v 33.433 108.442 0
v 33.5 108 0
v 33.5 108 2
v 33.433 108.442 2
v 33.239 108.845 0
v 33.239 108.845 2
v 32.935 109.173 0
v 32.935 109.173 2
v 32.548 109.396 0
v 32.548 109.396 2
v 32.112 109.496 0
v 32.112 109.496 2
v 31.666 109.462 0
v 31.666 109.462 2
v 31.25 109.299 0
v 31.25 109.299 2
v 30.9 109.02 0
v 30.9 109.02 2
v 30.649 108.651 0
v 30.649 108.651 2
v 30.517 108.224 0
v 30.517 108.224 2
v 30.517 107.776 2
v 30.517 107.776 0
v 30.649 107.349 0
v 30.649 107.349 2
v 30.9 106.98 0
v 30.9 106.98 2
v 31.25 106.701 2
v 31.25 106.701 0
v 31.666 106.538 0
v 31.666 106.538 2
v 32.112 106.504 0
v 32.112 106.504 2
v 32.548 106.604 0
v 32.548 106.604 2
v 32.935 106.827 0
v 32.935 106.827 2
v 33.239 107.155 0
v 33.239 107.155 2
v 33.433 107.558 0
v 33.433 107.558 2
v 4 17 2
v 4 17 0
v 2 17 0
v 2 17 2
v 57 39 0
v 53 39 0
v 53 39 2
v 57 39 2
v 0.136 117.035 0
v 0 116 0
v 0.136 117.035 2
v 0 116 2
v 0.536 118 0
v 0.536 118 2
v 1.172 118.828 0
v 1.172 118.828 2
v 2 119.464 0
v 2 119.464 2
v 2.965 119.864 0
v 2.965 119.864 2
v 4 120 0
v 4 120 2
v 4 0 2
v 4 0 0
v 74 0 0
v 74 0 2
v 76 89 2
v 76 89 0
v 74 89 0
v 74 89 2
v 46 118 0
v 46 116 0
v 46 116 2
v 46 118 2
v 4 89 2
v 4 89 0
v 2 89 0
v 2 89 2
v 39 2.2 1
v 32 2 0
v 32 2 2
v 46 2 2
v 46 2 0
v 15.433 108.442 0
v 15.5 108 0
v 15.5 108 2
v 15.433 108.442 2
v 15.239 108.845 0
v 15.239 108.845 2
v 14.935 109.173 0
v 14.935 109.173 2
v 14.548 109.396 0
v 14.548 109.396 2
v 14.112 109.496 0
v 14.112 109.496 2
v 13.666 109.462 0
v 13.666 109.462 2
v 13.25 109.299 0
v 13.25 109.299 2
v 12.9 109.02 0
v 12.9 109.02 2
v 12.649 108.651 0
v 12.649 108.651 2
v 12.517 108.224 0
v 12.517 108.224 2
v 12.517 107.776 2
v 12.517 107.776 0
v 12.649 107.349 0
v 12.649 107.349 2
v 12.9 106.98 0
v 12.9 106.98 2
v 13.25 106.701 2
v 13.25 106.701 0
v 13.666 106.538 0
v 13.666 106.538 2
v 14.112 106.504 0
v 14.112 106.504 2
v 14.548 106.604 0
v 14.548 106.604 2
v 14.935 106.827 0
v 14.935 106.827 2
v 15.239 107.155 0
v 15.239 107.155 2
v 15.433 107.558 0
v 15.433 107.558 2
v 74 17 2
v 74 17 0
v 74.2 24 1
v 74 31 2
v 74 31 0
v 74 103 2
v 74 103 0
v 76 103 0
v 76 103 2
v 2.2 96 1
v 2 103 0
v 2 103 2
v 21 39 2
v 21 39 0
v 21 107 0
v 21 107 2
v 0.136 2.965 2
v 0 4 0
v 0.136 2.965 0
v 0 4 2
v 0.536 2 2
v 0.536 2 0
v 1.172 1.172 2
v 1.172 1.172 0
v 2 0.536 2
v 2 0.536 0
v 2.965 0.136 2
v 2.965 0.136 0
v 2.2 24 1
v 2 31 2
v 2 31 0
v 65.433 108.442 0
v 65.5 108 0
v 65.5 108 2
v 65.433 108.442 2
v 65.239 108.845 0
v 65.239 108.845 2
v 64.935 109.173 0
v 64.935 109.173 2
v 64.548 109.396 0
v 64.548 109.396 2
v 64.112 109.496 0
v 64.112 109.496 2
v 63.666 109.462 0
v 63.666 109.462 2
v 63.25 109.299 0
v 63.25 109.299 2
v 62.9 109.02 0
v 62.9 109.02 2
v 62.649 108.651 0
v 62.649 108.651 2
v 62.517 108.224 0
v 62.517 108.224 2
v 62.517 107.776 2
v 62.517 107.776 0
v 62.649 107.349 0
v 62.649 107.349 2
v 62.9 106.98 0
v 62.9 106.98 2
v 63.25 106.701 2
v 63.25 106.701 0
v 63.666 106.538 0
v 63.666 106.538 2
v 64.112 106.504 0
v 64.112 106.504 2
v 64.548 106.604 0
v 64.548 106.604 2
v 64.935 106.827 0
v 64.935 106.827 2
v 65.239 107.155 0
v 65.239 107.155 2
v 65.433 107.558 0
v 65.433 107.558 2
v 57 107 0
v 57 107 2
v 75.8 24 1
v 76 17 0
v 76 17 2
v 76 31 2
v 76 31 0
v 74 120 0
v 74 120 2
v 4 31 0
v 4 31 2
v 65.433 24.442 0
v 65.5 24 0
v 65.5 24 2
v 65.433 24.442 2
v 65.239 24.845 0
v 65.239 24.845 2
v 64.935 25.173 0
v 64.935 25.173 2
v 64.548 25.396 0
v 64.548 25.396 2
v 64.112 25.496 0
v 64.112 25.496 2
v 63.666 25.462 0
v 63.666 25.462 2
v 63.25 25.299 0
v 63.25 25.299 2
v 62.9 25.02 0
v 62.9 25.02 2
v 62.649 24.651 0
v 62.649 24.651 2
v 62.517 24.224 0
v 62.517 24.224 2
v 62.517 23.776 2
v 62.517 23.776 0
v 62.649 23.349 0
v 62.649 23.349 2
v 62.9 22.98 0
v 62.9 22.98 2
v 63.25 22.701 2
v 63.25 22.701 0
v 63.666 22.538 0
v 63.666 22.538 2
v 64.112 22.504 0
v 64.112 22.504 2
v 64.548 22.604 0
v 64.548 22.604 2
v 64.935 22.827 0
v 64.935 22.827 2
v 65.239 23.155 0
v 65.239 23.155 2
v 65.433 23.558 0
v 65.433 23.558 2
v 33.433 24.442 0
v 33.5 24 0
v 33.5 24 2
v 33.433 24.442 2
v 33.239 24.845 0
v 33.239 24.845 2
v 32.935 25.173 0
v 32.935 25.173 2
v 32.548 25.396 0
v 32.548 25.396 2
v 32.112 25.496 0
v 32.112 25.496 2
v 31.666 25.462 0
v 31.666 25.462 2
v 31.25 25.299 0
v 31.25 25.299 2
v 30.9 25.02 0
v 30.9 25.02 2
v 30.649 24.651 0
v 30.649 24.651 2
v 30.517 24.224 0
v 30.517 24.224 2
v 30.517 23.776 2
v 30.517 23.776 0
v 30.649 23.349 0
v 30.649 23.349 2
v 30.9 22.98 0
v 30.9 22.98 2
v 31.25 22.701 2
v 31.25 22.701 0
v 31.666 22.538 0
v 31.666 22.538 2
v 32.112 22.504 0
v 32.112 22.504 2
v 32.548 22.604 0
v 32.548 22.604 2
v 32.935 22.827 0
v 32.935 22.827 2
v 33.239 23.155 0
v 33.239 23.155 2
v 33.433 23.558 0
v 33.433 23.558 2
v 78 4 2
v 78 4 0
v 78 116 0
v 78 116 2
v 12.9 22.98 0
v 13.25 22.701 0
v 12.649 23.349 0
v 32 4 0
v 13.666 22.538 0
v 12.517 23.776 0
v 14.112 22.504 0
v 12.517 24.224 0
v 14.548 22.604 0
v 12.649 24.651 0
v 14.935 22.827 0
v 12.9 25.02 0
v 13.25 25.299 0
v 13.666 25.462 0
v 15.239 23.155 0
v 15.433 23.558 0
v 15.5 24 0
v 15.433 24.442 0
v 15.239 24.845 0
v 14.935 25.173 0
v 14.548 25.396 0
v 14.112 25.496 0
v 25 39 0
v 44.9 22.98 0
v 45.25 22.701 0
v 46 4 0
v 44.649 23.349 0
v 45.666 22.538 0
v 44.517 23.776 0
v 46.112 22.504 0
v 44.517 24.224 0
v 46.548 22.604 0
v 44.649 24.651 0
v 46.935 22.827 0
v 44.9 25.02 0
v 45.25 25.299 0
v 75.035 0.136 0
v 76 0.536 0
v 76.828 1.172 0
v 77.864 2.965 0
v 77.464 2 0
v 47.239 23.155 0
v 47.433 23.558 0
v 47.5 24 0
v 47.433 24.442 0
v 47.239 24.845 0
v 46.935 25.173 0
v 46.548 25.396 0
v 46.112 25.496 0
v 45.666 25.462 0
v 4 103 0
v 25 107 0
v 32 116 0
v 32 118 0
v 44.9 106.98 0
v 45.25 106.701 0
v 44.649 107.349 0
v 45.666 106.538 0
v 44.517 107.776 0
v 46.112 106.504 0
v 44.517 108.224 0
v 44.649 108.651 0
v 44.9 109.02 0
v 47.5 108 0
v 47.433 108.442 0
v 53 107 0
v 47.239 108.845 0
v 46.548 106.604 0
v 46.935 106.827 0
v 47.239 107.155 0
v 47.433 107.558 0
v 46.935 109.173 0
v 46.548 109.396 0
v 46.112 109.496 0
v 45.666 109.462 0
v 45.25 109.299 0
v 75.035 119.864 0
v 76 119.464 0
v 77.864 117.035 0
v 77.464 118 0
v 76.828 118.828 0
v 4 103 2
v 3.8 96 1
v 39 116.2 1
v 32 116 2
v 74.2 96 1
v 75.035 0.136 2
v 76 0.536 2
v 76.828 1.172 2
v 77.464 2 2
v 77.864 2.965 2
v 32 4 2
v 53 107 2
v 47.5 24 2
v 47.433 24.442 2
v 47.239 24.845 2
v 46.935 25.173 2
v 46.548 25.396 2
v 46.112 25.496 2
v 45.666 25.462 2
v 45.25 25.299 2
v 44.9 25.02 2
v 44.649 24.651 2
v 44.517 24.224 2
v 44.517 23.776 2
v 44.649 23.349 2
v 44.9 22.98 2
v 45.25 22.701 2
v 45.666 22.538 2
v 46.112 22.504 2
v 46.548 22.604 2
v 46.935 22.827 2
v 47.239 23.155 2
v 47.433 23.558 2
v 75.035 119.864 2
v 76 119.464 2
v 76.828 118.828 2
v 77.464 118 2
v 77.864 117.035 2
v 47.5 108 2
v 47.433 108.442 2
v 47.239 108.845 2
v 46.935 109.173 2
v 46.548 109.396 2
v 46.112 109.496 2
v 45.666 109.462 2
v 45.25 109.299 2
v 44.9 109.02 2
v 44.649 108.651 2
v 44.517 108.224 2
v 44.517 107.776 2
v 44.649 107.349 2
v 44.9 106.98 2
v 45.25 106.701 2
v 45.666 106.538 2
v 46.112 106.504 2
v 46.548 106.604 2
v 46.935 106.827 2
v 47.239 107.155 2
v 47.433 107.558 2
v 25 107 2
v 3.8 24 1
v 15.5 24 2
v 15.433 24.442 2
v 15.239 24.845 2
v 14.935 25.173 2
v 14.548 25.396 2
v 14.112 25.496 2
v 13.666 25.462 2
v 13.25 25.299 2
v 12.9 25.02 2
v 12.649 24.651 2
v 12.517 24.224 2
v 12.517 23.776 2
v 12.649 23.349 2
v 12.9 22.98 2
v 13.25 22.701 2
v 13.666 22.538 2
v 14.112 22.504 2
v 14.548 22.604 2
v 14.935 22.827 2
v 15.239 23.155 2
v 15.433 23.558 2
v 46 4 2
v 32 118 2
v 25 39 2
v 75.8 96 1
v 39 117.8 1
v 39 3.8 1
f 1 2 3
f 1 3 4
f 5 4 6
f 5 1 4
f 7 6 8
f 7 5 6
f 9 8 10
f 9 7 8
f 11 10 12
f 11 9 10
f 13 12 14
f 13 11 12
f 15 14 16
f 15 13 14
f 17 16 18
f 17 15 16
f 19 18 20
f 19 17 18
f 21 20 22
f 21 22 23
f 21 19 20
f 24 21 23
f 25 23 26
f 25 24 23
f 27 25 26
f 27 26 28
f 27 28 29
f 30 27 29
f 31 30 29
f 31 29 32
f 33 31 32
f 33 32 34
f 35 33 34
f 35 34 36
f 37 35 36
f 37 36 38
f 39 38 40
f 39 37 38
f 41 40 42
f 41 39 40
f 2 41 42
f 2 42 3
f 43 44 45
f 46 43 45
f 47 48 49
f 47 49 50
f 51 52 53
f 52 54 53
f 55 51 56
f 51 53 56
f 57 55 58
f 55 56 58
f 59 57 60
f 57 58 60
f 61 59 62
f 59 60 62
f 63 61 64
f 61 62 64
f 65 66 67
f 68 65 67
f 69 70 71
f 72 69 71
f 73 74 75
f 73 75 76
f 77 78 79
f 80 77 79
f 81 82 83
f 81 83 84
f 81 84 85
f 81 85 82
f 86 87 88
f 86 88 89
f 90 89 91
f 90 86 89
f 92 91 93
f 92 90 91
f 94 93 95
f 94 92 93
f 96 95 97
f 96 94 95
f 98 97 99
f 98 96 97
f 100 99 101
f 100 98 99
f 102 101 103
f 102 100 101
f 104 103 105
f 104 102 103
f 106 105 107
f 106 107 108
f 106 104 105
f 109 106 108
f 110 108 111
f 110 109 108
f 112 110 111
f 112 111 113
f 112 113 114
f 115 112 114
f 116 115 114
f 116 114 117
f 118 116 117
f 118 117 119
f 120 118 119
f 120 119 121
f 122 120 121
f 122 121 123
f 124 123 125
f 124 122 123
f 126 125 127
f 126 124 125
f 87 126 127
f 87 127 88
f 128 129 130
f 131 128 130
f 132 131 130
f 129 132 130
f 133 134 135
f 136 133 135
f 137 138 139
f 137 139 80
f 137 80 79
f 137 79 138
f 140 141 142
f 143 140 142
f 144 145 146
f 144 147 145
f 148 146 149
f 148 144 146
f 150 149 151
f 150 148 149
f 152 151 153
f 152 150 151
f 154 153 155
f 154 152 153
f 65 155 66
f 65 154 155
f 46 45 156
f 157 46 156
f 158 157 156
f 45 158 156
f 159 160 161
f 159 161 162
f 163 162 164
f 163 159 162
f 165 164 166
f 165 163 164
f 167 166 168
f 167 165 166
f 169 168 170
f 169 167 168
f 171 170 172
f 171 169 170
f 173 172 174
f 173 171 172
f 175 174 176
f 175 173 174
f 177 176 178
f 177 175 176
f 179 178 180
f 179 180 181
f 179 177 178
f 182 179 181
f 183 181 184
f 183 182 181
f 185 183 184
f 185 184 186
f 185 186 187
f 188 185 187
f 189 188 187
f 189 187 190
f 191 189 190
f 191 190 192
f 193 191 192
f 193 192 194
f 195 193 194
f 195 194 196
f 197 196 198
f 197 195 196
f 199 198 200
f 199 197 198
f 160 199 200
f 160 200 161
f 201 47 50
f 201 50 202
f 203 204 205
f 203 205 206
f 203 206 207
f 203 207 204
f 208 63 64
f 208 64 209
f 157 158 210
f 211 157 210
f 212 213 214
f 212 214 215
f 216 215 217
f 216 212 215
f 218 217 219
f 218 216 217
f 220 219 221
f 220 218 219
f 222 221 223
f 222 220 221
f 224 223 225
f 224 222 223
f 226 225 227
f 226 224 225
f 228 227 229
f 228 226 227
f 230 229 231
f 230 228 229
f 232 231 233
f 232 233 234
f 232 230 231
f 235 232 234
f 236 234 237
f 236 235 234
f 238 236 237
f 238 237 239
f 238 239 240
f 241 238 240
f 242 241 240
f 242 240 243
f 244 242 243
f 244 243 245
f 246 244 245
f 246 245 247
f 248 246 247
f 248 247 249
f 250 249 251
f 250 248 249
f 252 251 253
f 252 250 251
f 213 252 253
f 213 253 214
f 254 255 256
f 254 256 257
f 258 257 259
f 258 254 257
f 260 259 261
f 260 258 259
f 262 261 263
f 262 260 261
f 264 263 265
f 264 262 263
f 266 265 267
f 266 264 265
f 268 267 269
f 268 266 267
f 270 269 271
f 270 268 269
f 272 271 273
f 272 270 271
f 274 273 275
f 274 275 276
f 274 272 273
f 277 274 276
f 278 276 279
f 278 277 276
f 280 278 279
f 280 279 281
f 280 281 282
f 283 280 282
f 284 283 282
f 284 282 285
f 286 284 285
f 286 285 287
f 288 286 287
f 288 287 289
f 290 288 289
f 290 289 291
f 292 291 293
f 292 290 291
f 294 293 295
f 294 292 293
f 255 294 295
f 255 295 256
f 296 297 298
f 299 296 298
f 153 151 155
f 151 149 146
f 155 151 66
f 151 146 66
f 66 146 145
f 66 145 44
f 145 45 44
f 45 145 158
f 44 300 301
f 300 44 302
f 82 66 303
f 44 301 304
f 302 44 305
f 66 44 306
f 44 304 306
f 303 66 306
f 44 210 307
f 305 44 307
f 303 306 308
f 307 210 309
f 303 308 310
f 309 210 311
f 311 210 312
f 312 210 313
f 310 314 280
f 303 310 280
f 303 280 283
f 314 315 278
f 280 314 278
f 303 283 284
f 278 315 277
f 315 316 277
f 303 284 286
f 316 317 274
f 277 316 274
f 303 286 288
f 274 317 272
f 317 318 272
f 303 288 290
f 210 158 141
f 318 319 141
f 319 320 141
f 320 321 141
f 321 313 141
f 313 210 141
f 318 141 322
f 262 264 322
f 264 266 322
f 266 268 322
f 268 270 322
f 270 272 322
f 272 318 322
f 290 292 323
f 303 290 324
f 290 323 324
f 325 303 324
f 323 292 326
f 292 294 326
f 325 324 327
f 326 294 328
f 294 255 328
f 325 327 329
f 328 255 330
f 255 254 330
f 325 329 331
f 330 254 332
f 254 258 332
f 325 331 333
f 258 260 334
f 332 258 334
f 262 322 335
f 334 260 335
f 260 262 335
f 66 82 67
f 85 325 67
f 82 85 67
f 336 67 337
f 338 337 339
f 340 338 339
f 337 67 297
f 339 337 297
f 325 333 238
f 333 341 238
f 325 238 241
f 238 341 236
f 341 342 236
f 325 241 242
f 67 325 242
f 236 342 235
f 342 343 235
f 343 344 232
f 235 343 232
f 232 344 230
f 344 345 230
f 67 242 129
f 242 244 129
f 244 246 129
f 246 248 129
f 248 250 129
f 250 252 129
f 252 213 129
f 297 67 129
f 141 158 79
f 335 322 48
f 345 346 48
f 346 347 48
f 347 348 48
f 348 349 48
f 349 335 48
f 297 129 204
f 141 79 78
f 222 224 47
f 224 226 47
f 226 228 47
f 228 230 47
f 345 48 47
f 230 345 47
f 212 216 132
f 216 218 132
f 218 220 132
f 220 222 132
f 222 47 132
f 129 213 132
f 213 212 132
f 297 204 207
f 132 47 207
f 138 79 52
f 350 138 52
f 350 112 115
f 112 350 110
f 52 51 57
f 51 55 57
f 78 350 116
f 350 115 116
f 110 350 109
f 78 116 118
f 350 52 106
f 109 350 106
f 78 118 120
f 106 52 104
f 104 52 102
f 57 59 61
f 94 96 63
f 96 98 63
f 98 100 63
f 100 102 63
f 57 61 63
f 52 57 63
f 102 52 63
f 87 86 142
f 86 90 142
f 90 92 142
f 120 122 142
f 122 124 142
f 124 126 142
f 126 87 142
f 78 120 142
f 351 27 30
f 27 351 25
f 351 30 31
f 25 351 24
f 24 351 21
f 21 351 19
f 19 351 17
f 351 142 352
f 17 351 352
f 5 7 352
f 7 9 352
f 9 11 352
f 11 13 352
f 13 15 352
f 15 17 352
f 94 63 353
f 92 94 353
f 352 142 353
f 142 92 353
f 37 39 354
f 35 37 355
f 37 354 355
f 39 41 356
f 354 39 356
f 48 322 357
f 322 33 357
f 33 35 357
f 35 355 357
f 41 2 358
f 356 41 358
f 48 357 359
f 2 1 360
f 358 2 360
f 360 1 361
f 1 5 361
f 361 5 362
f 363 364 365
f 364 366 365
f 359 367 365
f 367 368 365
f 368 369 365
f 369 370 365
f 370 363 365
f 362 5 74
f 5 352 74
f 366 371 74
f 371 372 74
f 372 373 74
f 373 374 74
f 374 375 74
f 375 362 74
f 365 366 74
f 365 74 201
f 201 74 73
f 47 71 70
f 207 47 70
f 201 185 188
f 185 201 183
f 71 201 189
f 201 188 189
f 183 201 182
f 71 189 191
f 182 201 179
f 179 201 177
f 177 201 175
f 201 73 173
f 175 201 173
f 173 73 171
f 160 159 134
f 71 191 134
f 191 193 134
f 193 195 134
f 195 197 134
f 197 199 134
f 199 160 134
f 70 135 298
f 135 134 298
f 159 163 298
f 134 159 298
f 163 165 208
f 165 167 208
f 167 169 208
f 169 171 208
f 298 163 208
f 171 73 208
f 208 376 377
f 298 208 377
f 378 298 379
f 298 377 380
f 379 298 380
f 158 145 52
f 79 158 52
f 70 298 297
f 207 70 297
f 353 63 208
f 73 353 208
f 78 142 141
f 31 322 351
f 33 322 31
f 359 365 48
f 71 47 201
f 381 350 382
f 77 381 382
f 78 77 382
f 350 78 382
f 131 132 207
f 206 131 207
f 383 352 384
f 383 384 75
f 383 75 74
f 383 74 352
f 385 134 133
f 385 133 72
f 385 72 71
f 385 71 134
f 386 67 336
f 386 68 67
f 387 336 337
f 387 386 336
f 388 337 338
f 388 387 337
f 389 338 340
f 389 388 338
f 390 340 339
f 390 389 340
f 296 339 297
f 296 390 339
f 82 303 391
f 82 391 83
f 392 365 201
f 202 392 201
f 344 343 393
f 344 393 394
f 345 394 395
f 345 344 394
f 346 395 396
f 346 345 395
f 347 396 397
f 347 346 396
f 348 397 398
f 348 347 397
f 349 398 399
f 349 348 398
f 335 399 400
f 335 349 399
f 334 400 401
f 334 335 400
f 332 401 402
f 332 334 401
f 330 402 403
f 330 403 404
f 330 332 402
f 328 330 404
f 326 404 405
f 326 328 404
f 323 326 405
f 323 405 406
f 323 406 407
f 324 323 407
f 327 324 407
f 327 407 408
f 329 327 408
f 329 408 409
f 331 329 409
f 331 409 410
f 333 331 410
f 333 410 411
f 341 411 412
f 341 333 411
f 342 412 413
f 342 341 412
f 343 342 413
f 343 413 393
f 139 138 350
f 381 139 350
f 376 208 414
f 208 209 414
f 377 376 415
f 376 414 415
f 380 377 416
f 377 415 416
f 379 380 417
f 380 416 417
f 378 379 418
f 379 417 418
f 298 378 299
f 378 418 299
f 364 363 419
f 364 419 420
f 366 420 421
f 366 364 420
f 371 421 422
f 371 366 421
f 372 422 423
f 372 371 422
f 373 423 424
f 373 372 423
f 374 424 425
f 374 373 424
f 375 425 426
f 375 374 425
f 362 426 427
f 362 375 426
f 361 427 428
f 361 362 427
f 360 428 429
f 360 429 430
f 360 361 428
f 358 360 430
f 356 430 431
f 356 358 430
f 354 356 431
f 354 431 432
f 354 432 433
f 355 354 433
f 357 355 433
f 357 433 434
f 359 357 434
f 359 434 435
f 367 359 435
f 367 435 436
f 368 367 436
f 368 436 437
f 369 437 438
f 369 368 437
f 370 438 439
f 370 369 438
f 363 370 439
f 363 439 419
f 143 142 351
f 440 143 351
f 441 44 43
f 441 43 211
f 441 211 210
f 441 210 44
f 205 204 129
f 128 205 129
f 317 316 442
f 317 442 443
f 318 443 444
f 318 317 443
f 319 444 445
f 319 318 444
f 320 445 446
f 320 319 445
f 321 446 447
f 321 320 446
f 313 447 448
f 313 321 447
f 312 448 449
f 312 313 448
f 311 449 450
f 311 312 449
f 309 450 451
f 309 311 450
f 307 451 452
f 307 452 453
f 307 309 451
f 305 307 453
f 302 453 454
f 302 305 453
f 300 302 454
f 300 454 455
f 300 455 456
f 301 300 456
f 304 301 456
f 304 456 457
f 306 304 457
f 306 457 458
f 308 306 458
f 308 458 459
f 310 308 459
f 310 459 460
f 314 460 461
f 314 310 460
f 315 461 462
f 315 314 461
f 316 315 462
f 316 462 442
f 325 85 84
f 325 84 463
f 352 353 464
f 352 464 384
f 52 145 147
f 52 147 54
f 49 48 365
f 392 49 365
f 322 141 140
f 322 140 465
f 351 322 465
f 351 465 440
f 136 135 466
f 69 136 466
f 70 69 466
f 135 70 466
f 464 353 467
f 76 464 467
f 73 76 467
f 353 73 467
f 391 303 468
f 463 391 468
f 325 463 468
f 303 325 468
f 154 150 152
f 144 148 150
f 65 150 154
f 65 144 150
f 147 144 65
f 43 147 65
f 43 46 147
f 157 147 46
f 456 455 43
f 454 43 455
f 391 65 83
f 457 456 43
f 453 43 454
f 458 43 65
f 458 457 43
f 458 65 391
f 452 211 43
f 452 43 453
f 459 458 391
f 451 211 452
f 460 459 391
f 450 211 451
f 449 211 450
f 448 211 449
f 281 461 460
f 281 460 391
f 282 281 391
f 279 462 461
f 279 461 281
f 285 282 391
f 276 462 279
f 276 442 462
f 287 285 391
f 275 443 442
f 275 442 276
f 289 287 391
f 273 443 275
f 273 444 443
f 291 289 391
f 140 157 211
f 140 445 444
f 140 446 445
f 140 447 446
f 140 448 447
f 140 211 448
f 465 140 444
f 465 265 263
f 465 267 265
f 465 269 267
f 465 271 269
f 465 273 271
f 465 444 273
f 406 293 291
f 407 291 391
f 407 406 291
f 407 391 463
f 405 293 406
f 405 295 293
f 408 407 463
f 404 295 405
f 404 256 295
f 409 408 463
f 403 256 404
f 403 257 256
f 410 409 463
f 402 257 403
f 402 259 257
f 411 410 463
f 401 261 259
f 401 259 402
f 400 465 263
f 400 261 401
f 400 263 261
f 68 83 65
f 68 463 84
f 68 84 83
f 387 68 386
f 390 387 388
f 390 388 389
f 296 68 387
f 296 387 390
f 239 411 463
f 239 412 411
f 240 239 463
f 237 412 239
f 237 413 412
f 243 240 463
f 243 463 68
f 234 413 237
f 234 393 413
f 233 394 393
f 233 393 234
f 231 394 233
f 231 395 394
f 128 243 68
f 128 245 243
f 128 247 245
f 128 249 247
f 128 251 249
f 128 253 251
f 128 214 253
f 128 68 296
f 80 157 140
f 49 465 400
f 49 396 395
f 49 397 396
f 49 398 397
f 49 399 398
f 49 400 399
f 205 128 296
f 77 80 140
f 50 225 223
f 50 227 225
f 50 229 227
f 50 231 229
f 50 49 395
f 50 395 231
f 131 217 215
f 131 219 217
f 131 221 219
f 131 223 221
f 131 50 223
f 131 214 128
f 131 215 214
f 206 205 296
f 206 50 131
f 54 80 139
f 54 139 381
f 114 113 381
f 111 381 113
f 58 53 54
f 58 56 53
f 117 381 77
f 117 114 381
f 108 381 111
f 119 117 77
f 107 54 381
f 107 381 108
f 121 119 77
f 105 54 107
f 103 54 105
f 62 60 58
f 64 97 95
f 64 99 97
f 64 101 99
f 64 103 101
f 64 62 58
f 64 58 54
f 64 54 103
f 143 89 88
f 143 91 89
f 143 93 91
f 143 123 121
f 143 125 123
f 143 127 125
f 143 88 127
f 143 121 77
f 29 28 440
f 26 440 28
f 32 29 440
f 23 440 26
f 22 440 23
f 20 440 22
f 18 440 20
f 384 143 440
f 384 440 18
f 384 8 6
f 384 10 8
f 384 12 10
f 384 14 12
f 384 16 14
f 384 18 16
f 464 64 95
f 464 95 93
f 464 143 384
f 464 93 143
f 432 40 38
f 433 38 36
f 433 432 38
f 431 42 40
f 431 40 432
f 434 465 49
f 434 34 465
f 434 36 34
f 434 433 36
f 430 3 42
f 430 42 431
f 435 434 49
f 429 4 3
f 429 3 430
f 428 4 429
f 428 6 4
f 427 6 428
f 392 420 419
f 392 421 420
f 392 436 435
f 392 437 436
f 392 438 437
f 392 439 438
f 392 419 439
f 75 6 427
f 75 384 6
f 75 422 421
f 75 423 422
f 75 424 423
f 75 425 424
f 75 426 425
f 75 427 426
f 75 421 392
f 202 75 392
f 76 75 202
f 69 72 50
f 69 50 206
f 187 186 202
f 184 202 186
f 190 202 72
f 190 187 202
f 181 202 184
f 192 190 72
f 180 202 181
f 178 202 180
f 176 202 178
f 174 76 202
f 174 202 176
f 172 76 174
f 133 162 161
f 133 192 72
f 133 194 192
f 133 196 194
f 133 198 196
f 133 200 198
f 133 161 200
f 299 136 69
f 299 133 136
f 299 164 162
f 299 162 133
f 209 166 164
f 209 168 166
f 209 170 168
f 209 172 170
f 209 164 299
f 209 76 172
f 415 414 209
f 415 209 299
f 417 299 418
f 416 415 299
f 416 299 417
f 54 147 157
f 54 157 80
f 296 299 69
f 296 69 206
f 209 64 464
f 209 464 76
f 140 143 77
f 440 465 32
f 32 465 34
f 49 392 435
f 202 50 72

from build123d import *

# Parameters (mm, degrees)
SKETCH1_W              = 78
SKETCH1_H              = 120
SKETCH1_R              = 1.5
SKETCH1_W_2            = 4
SKETCH1_H_2            = 68
MAIN_SLIDER_TOP_DEPTH  = 2
SLIDE_TOP_CONTOURING_R = 4


with BuildPart() as part:
    # Sketch1 → Main Slider Top (new body)
    with BuildSketch(Plane.XY):
        with Locations((39, 60)):
            Rectangle(SKETCH1_W, SKETCH1_H)
        with Locations((14, 108)):
            Circle(SKETCH1_R, mode=Mode.SUBTRACT)
        with Locations((32, 108)):
            Circle(SKETCH1_R, mode=Mode.SUBTRACT)
        with Locations((14, 24)):
            Circle(SKETCH1_R, mode=Mode.SUBTRACT)
        with Locations((32, 24)):
            Circle(SKETCH1_R, mode=Mode.SUBTRACT)
        with Locations((46, 108)):
            Circle(SKETCH1_R, mode=Mode.SUBTRACT)
        with Locations((64, 108)):
            Circle(SKETCH1_R, mode=Mode.SUBTRACT)
        with Locations((46, 24)):
            Circle(SKETCH1_R, mode=Mode.SUBTRACT)
        with Locations((64, 24)):
            Circle(SKETCH1_R, mode=Mode.SUBTRACT)
        with Locations((23, 73)):
            Rectangle(SKETCH1_W_2, SKETCH1_H_2, mode=Mode.SUBTRACT)
        with Locations((55, 73)):
            Rectangle(SKETCH1_W_2, SKETCH1_H_2, mode=Mode.SUBTRACT)
        with BuildLine():
            Line((32, 118), (32, 116))
            add(Edge.make_bspline(
                [(32, 116), (39, 116.4), (46, 116)],
                knots=[0, 0, 0, 1, 1, 1], degree=2))
            Line((46, 116), (46, 118))
            add(Edge.make_bspline(
                [(32, 118), (39, 117.6), (46, 118)],
                knots=[0, 0, 0, 1, 1, 1], degree=2))
        make_face(mode=Mode.SUBTRACT)
        with BuildLine():
            Line((46, 2), (46, 4))
            add(Edge.make_bspline(
                [(32, 4), (39, 3.6), (46, 4)],
                knots=[0, 0, 0, 1, 1, 1], degree=2))
            Line((32, 4), (32, 2))
            add(Edge.make_bspline(
                [(32, 2), (39, 2.4), (46, 2)],
                knots=[0, 0, 0, 1, 1, 1], degree=2))
        make_face(mode=Mode.SUBTRACT)
        with BuildLine():
            Line((2, 31), (4, 31))
            add(Edge.make_bspline(
                [(4, 17), (3.6, 24), (4, 31)],
                knots=[0, 0, 0, 1, 1, 1], degree=2))
            Line((4, 17), (2, 17))
            add(Edge.make_bspline(
                [(2, 17), (2.4, 24), (2, 31)],
                knots=[0, 0, 0, 1, 1, 1], degree=2))
        make_face(mode=Mode.SUBTRACT)
        with BuildLine():
            Line((76, 17), (74, 17))
            add(Edge.make_bspline(
                [(74, 17), (74.4, 24), (74, 31)],
                knots=[0, 0, 0, 1, 1, 1], degree=2))
            Line((74, 31), (76, 31))
            add(Edge.make_bspline(
                [(76, 17), (75.6, 24), (76, 31)],
                knots=[0, 0, 0, 1, 1, 1], degree=2))
        make_face(mode=Mode.SUBTRACT)
        with BuildLine():
            Line((76, 89), (74, 89))
            add(Edge.make_bspline(
                [(74, 103), (74.4, 96), (74, 89)],
                knots=[0, 0, 0, 1, 1, 1], degree=2))
            Line((74, 103), (76, 103))
            add(Edge.make_bspline(
                [(76, 103), (75.6, 96), (76, 89)],
                knots=[0, 0, 0, 1, 1, 1], degree=2))
        make_face(mode=Mode.SUBTRACT)
        with BuildLine():
            Line((2, 103), (4, 103))
            add(Edge.make_bspline(
                [(4, 103), (3.6, 96), (4, 89)],
                knots=[0, 0, 0, 1, 1, 1], degree=2))
            Line((4, 89), (2, 89))
            add(Edge.make_bspline(
                [(2, 103), (2.4, 96), (2, 89)],
                knots=[0, 0, 0, 1, 1, 1], degree=2))
        make_face(mode=Mode.SUBTRACT)
    extrude(amount=MAIN_SLIDER_TOP_DEPTH)

    # Slide Top Contouring
    slide_top_contouring_edges = [part.edges().sort_by_distance(p)[0] for p in [
        (0, 0, 1),
        (0, 120, 1),
        (78, 120, 1),
        (78, 0, 1),
    ]]
    fillet(slide_top_contouring_edges, radius=SLIDE_TOP_CONTOURING_R)


solid = part.part
